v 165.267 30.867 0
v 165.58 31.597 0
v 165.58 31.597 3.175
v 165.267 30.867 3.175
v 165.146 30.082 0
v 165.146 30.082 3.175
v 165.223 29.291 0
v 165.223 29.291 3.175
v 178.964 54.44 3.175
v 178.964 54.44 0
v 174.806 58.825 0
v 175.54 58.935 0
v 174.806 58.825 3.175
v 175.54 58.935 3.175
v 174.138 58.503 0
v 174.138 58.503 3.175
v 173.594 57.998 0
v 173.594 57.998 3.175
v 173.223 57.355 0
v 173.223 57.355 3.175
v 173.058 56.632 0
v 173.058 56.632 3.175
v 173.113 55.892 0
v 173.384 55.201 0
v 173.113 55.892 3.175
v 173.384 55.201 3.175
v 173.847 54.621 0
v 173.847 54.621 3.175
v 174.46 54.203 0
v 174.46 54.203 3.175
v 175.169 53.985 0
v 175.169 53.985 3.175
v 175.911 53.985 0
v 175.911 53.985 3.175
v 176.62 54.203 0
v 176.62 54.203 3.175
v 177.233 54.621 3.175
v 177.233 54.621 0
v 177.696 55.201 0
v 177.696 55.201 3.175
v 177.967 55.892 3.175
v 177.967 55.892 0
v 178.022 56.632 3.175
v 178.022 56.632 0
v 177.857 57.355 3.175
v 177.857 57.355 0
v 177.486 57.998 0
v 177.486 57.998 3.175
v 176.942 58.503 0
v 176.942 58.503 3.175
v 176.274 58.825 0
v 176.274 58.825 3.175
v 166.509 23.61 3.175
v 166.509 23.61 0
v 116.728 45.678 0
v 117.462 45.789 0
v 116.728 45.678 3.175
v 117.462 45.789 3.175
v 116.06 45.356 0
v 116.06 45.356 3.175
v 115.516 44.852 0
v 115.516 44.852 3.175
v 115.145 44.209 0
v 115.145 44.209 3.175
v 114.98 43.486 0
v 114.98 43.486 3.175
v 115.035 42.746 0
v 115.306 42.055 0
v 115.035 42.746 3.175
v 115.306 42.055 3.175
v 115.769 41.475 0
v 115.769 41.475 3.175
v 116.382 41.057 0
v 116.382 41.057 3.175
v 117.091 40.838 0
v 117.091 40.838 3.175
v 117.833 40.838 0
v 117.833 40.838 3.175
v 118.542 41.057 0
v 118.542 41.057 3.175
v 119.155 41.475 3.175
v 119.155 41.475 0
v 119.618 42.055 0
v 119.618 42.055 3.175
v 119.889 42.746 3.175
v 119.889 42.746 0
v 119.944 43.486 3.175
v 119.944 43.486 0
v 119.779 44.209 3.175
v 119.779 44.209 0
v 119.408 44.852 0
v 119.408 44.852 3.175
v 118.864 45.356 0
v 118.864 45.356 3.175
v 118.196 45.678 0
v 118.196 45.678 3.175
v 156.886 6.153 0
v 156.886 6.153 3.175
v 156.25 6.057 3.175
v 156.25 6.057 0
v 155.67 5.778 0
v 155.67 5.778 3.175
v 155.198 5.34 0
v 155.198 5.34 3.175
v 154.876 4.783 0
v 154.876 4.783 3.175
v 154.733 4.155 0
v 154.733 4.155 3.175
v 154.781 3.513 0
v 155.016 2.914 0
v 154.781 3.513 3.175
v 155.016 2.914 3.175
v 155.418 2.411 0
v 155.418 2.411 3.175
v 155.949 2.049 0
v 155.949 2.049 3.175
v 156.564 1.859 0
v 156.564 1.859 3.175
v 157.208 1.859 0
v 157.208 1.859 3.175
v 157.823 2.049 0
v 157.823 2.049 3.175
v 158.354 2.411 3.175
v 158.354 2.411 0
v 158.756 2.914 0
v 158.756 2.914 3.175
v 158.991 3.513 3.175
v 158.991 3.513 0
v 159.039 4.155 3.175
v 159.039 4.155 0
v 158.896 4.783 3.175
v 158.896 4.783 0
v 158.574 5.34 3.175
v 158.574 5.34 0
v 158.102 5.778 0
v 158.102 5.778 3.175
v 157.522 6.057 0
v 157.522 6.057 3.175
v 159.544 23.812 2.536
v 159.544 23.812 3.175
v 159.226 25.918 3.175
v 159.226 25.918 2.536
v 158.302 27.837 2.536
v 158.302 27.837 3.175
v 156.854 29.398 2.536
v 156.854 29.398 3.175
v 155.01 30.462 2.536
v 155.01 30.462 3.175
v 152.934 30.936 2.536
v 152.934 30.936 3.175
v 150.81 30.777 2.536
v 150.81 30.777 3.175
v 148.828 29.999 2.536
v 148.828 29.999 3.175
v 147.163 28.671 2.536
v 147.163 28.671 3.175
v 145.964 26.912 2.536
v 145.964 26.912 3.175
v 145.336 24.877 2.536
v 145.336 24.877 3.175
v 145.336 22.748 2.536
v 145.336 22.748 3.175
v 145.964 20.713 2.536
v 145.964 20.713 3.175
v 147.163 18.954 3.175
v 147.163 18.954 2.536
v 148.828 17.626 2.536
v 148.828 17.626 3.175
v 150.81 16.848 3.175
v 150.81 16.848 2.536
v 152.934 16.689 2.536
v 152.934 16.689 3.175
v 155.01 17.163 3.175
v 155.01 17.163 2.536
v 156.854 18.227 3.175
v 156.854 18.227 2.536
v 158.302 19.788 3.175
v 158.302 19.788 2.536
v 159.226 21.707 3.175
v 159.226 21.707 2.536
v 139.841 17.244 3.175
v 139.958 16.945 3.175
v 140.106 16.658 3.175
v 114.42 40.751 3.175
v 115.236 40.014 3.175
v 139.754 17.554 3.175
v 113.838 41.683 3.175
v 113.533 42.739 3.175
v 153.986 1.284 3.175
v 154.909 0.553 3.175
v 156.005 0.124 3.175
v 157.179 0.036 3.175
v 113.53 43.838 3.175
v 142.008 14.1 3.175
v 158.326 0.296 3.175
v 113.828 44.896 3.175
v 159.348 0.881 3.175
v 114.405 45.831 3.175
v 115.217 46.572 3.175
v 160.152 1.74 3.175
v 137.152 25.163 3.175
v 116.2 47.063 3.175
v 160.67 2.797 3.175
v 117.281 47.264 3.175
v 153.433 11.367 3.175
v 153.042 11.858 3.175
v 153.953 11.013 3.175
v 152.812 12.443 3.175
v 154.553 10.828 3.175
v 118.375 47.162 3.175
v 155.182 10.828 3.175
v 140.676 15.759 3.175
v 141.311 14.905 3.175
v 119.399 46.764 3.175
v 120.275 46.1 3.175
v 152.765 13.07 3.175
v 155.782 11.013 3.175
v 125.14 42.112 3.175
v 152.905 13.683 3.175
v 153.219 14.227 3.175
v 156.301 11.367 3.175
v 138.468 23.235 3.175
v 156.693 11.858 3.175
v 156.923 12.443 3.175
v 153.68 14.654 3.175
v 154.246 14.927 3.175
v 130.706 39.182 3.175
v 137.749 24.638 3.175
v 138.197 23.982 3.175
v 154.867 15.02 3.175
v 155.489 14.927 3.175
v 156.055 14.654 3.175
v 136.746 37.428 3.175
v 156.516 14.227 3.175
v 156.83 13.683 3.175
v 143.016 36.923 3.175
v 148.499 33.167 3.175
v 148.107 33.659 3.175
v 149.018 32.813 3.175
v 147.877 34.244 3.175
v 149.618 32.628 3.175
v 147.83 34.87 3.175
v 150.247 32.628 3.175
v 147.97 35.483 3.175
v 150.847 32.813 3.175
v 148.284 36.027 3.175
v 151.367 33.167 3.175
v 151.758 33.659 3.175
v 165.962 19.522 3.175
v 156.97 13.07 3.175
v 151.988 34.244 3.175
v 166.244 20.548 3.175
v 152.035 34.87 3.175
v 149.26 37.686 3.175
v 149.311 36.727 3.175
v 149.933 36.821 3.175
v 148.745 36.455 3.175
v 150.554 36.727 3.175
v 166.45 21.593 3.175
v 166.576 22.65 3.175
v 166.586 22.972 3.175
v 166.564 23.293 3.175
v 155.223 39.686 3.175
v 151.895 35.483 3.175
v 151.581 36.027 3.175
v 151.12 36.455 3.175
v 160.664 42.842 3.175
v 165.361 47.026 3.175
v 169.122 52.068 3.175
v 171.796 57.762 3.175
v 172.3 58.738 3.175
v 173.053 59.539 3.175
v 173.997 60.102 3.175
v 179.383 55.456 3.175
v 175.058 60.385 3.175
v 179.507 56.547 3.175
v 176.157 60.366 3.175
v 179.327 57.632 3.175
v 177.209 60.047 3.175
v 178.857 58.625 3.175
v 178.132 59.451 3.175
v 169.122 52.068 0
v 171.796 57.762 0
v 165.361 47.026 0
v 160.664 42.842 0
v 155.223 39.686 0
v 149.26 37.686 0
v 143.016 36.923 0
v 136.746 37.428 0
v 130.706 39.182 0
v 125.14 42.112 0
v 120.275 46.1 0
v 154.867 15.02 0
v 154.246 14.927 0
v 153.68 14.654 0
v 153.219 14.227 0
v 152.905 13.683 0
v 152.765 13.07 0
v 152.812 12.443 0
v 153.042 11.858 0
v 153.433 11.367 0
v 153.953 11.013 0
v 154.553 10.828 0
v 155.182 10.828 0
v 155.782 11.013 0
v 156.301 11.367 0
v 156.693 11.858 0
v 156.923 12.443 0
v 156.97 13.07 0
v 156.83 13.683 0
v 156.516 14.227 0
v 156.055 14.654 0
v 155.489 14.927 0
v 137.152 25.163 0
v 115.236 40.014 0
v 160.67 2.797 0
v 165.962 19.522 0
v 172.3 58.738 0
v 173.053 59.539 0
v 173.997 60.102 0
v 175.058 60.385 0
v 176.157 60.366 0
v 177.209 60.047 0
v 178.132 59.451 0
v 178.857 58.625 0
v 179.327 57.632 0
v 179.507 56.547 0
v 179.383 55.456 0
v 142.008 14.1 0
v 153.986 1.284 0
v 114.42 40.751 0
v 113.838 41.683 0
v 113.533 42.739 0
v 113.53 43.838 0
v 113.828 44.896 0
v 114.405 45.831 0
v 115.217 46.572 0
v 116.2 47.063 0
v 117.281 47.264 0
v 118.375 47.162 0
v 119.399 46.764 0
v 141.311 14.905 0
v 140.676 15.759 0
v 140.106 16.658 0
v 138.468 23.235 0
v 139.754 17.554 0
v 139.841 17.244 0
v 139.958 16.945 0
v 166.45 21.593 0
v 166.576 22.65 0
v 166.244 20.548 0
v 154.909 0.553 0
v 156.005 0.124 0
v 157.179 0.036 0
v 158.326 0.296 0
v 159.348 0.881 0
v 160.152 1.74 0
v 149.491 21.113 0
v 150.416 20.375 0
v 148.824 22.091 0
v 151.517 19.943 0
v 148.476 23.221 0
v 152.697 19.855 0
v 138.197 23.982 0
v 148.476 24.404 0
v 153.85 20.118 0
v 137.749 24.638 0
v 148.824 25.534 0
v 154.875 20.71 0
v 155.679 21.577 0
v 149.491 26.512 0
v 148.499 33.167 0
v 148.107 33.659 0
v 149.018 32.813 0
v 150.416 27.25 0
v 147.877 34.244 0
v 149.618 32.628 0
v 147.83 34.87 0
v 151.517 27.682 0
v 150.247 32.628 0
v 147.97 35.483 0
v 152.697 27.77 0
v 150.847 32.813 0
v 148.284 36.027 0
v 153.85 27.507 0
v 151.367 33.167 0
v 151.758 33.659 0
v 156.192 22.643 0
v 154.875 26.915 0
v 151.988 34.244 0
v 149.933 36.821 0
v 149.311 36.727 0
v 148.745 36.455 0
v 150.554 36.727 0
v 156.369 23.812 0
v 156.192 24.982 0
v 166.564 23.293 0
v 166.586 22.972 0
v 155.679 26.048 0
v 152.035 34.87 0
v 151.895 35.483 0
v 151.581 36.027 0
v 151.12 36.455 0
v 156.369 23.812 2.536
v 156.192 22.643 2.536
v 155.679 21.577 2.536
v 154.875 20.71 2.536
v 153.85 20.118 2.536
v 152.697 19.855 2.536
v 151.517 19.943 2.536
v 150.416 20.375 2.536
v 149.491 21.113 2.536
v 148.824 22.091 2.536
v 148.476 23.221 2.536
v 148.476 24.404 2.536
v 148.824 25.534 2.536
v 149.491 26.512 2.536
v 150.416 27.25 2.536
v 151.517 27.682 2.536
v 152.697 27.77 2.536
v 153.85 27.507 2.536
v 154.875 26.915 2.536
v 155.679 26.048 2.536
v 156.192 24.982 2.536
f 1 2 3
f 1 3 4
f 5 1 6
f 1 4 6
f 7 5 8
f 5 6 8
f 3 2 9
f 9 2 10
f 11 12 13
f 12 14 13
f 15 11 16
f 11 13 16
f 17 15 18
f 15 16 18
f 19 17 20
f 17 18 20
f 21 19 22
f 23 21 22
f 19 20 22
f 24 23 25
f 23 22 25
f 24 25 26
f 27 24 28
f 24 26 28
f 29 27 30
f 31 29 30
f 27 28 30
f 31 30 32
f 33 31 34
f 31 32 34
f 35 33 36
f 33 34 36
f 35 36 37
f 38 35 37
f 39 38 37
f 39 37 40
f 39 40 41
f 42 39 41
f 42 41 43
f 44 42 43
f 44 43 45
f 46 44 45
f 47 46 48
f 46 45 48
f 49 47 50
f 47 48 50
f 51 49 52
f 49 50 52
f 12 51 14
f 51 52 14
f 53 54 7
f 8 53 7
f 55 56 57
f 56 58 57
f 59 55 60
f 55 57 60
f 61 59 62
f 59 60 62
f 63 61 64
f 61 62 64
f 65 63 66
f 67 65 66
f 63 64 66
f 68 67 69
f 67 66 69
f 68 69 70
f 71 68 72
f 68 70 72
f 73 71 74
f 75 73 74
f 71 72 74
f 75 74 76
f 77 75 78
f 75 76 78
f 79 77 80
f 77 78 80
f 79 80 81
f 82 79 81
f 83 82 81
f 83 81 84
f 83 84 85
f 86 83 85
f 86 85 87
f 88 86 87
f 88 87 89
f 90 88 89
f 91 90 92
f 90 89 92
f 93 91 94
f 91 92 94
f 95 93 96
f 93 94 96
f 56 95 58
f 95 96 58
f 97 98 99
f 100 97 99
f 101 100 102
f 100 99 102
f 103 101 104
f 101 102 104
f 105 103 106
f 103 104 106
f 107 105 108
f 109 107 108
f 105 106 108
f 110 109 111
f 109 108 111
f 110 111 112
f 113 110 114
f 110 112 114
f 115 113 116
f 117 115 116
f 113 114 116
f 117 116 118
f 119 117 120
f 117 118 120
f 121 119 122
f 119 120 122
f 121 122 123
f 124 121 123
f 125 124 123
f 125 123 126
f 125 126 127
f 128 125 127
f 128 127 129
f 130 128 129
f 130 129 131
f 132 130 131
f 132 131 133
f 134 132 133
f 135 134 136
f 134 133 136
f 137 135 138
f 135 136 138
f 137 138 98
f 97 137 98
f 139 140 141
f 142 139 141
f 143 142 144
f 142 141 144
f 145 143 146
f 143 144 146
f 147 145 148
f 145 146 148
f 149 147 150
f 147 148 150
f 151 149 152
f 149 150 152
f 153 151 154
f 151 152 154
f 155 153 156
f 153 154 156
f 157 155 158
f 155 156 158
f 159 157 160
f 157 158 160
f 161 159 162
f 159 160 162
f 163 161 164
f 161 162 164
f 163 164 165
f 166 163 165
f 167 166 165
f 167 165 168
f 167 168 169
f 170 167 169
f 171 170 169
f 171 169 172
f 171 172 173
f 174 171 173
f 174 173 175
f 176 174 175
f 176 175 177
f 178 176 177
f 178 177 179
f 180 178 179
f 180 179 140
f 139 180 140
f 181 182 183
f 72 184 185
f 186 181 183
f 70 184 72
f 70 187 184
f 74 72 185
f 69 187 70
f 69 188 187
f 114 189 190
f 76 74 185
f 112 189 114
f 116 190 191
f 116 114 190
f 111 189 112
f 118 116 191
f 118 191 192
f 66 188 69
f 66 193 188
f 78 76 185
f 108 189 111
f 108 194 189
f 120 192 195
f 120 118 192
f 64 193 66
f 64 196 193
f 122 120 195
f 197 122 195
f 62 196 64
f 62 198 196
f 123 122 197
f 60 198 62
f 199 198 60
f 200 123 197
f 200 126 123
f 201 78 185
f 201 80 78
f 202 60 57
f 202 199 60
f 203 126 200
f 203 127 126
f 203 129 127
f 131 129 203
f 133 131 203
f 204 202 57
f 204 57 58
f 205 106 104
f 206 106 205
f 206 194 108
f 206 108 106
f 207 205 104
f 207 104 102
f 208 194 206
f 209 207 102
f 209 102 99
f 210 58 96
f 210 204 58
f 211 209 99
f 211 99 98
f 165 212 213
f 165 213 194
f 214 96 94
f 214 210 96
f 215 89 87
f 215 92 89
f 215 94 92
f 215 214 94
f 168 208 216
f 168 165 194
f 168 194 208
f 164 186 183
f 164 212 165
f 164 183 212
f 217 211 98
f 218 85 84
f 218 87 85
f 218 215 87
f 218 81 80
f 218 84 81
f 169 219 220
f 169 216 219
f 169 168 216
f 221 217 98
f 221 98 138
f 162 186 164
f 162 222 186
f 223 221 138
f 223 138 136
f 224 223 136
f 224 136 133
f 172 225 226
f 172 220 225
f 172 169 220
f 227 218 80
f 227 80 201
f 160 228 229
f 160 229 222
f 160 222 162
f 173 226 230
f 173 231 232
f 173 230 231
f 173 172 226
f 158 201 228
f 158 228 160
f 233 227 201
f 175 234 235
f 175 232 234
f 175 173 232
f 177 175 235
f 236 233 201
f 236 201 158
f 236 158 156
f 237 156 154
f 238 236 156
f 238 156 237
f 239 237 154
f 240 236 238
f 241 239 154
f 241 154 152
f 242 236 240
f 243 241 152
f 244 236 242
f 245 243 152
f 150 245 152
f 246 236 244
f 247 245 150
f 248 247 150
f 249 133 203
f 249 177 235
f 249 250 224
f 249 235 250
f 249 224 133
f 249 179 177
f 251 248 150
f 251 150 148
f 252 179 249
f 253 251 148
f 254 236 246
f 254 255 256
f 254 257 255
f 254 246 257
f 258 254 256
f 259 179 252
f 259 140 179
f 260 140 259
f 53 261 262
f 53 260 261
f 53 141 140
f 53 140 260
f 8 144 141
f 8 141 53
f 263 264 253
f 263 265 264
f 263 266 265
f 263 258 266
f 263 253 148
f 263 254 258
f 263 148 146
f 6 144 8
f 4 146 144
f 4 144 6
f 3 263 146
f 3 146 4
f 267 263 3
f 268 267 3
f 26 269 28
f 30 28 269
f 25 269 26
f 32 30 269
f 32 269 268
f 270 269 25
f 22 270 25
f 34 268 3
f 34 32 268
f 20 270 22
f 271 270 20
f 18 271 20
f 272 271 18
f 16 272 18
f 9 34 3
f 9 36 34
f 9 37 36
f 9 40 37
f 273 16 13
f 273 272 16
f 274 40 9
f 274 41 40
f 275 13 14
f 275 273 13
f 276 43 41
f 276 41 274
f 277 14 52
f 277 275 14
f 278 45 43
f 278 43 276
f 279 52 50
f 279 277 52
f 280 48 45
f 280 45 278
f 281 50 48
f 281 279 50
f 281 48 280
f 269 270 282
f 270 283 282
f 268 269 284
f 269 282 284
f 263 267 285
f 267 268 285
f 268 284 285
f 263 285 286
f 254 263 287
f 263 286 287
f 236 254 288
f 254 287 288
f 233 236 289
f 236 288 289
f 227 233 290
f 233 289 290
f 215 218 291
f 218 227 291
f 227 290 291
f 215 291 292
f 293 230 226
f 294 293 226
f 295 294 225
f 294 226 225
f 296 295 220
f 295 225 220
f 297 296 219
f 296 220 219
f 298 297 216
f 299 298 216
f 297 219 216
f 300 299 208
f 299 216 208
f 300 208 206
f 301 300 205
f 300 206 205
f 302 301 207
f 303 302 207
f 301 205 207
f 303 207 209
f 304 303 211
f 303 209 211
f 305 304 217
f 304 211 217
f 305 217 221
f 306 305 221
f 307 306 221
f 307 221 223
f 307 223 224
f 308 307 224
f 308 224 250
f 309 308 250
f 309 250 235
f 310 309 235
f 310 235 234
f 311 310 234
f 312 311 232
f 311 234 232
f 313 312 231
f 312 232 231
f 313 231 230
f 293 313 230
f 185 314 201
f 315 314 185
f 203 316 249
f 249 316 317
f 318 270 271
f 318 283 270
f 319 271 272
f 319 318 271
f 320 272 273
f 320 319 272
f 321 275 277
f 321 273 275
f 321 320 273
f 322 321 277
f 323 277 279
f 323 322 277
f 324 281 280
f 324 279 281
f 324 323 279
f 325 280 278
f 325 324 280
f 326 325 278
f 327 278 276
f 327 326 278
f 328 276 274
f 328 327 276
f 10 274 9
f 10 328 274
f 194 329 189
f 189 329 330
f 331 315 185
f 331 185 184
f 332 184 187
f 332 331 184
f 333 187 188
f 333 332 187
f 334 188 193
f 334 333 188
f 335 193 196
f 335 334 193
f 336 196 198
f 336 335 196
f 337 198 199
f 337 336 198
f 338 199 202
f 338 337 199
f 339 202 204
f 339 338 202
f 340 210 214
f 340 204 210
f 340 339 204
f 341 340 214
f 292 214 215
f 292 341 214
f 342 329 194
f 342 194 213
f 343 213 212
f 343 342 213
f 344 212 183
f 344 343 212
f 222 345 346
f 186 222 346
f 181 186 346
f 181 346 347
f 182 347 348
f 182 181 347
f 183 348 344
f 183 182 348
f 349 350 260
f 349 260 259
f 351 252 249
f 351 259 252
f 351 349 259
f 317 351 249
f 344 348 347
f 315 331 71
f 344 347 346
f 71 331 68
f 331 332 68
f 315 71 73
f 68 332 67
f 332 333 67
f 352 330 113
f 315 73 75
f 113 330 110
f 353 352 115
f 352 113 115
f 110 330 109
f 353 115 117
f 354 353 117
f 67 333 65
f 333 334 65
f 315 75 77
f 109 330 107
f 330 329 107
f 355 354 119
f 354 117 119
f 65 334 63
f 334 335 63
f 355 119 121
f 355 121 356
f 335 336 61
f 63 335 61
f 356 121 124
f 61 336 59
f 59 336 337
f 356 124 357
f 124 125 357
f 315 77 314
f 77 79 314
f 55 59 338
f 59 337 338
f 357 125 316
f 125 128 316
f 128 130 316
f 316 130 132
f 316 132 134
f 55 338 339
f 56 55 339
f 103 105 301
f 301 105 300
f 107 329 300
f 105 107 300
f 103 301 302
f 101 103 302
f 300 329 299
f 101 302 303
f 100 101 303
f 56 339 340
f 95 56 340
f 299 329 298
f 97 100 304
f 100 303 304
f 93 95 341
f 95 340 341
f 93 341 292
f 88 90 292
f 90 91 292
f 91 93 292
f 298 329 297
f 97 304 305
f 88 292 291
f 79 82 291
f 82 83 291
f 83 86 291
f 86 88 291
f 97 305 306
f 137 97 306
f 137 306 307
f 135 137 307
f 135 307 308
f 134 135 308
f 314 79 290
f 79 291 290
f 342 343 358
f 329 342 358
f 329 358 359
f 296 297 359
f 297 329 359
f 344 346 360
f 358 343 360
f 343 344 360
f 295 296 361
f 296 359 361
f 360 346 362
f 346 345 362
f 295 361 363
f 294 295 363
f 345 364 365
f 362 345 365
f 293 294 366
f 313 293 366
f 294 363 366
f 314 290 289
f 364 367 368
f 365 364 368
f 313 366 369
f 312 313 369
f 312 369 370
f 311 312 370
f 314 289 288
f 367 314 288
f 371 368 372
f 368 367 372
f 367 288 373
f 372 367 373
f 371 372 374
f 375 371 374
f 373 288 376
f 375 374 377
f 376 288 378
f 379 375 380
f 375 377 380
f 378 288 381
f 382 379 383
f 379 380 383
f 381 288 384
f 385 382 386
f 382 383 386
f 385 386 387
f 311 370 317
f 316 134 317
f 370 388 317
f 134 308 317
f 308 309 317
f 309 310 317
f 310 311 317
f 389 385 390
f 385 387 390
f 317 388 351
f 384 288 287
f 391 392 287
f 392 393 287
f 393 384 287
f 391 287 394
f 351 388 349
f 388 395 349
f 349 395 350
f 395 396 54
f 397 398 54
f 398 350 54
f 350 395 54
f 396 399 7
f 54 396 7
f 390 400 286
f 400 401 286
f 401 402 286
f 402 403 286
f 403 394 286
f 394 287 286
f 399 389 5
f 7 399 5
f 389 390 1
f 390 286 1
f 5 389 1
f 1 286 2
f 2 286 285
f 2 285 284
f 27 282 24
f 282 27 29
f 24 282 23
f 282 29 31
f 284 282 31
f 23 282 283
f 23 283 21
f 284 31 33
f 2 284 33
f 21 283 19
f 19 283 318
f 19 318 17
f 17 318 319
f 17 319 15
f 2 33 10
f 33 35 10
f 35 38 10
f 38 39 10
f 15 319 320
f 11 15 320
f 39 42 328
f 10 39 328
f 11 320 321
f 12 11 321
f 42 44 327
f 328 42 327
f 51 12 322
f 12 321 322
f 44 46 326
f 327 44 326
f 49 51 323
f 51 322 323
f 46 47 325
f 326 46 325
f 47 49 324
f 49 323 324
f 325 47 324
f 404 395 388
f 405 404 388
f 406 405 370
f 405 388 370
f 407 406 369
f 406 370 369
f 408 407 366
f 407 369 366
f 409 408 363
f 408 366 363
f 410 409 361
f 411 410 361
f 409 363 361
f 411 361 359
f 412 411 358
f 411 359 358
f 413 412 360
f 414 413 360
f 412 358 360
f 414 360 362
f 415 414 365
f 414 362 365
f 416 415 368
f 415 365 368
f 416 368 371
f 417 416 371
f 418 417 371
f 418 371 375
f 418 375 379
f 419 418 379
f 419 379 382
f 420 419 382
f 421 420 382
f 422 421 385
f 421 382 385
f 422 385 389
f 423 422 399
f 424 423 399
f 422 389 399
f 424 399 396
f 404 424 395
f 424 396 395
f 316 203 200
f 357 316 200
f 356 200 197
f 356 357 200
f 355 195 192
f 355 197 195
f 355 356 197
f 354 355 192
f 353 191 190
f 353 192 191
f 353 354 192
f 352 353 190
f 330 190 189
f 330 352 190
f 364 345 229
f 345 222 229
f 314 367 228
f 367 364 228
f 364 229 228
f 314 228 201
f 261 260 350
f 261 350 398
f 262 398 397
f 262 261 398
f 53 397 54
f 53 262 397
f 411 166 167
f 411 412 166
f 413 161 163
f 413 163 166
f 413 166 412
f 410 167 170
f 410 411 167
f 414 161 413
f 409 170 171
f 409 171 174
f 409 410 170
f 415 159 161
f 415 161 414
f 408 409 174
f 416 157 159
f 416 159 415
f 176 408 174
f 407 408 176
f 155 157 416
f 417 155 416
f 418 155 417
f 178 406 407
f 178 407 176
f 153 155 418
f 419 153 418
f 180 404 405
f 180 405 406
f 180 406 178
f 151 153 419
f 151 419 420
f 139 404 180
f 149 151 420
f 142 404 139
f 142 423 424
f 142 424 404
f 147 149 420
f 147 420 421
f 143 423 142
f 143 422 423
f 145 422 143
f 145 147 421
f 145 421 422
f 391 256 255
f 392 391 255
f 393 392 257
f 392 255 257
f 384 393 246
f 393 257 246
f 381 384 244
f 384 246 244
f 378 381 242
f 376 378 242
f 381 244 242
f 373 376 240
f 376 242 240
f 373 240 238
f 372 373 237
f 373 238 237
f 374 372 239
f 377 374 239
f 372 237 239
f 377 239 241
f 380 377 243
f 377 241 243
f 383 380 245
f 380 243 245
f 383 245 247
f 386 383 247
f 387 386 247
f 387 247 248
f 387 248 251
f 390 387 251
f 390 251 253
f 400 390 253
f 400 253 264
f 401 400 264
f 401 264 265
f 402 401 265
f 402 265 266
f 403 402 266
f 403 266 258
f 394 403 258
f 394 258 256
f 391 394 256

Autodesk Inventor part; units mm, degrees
ref_plane "YZ Plane" through (0, 0, 0) normal (1, 0, 0) x (0, 1, 0)
ref_plane "XZ Plane" through (0, 0, 0) normal (0, 1, 0) x (-1, 0, 0)
ref_plane "XY Plane" through (0, 0, 0) normal (0, 0, 1) x (1, 0, 0)
sketch "Main Outline" plane through (0, 0, 0) normal (0, 0, 1) x (1, 0, 0)
  line L0 (0, 0) -> (304.8, 0) construction
  line L1 (304.8, 0) -> (304.8, 50.8) construction
  line L2 (304.8, 50.8) -> (0, 50.8) construction
  line L3 (0, 50.8) -> (0, 0) construction
  line L4 (0, 50.8) -> (0, 53.34) construction
  line L5 (0, 53.34) -> (304.8, 53.34) construction
  line L6 (304.8, 53.34) -> (304.8, 50.8) construction
  circle A0 centre (152.4, 23.8125) radius 17.4625 construction
  line L7 (152.4, 23.8125) -> (152.4, 0) construction
  circle A1 centre (152.4, 23.8125) radius 27.94 construction
  circle A2 centre (152.4, 23.8125) radius 21.59 construction
  line L8 (152.4, 23.8125) -> (144.1569, 60.2292) construction
  circle A3 centre (144.1569, 60.2292) radius 15.24 construction
  circle A4 centre (144.1569, 60.2292) radius 8.89 construction
  circle A5 centre (144.1569, 60.2292) radius 14.2875 construction
  arc A6 (163.8162, 72.0089) -> (128.198, 43.7805) centre (144.1569, 60.2292) ccw construction
  circle A7 centre (98.8106, 85.598) radius 32.258 construction
  circle A8 centre (124.5097, 147.0273) radius 32.258 construction
  circle A9 centre (174.158, 102.6533) radius 32.258 construction
  circle A10 centre (144.1569, 60.2292) radius 11.1125 construction
  circle A11 centre (152.4, 23.8125) radius 49.53 construction
  line L9 (144.1569, 60.2292) -> (124.5097, 147.0273) construction
  line L10 (144.1569, 60.2292) -> (98.8106, 85.598) construction
  line L11 (98.8106, 85.598) -> (174.158, 102.6533) construction
  line L12 (174.158, 102.6533) -> (144.1569, 60.2292) construction
  circle A12 centre (98.8106, 85.598) radius 9.5493 construction
  arc A13 (172.0498, 111.9669) -> (183.1109, 99.3313) centre (174.158, 102.6533) ccw construction
  circle A14 centre (124.5097, 147.0273) radius 9.5493 construction
  line L13 (96.7024, 94.9117) -> (172.0498, 111.9669) construction
  line L14 (183.1109, 99.3313) -> (165.6438, 52.2565) construction
  line L15 (92.161, 78.7444) -> (128.198, 43.7805) construction
  line L16 (172.0498, 111.9669) -> (174.158, 102.6533) construction
  line L17 (174.158, 102.6533) -> (183.1109, 99.3313) construction
  arc A15 (183.1109, 99.3313) -> (172.0498, 111.9669) centre (174.158, 102.6533) ccw construction
  arc A16 (165.6438, 52.2565) -> (163.8162, 72.0089) centre (144.1569, 60.2292) ccw construction
  arc A17 (128.198, 43.7805) -> (165.6438, 52.2565) centre (144.1569, 60.2292) ccw construction
  circle A18 centre (124.4396, 147.337) radius 32.258 construction
  circle A19 centre (124.3695, 147.6466) radius 32.258 construction
  circle A20 centre (124.2994, 147.9563) radius 32.258 construction
  line L18 (124.5097, 147.0273) -> (124.2994, 147.9563) construction
  circle A21 centre (124.5798, 146.7176) radius 32.258 construction
  circle A22 centre (117.4622, 43.2997) radius 9.525 construction
  circle A23 centre (175.54, 56.4459) radius 9.525 construction
  line L19 (152.4, 23.8125) -> (117.4622, 43.2997) construction
  line L20 (152.4, 23.8125) -> (175.54, 56.4459) construction
  line L21 (117.4622, 43.2997) -> (98.8106, 85.598) construction
  line L22 (175.54, 56.4459) -> (174.158, 102.6533) construction
  circle A24 centre (133.7342, 106.2753) radius 7.9375 construction
  line L23 (133.401, 150.5107) -> (165.496, 68.5894) construction
  circle A25 centre (152.4, 23.8125) radius 29.845 construction
  line L24 (114.985, 146.3422) -> (121.2977, 58.5849) construction
  circle A26 centre (99.0876, 85.443) radius 32.258 construction
  circle A27 centre (97.9793, 86.063) radius 32.258 construction
  line L25 (97.9793, 86.063) -> (98.8106, 85.598) construction
  circle A28 centre (98.2564, 85.908) radius 32.258 construction
  circle A29 centre (98.5335, 85.753) radius 32.258 construction
  circle A30 centre (152.4, 23.8125) radius 29.845 construction
  circle A31 centre (122.555, 23.8125) radius 6.35 construction
  circle A32 centre (179.3358, 36.6651) radius 6.35 construction
  line L26 (122.555, 23.8125) -> (152.4, 23.8125) construction
  line L27 (152.4, 23.8125) -> (182.245, 23.8125) construction
  circle A33 centre (182.245, 23.8125) radius 6.35 construction
  circle A34 centre (125.4642, 10.9599) radius 6.35 construction
  circle A35 centre (150.1885, 33.5827) radius 39.8623 construction
  line L28 (72.8944, 65.7819) -> (119.1902, 8.5205) construction
  circle A36 centre (174.708, 103.431) radius 32.258 construction
  line L29 (174.158, 102.6533) -> (174.708, 103.431) construction
  circle A37 centre (174.5246, 103.1717) radius 32.258 construction
  circle A38 centre (174.3413, 102.9125) radius 32.258 construction
  circle A39 centre (173.9747, 102.394) radius 32.258 construction
  line L30 (188.958, 24.3128) -> (206.0816, 95.9295) construction
  circle A40 centre (133.7342, 106.2753) radius 8.1693 construction
  arc A41 (85.4541, 115.7901) -> (94.2274, 135.7949) centre (79.2901, 130.4196) ccw construction
  arc A42 (156.6774, 149.9308) -> (173.2104, 135.6542) centre (172.4734, 151.5121) ccw construction
  line L31 (124.2994, 147.9563) -> (124.8602, 145.479) construction
  line L32 (114.3901, 145.7133) -> (114.9509, 143.236) construction
  line L33 (134.7695, 147.722) -> (134.2088, 150.1993) construction
  arc A43 (134.2088, 150.1993) -> (114.3901, 145.7133) centre (124.2994, 147.9563) ccw construction
  arc A44 (114.9509, 143.236) -> (134.7695, 147.722) centre (124.8602, 145.479) ccw construction
  line L34 (174.708, 103.431) -> (173.2414, 101.3571) construction
  line L35 (166.4126, 109.2972) -> (164.9461, 107.2234) construction
  line L36 (181.5368, 95.4909) -> (183.0033, 97.5647) construction
  arc A45 (183.0033, 97.5647) -> (166.4126, 109.2972) centre (174.708, 103.431) ccw construction
  arc A46 (164.9461, 107.2234) -> (181.5368, 95.4909) centre (173.2414, 101.3571) ccw construction
  line L37 (97.9793, 86.063) -> (100.196, 84.8229) construction
  line L38 (93.0188, 77.1963) -> (95.2355, 75.9562) construction
  line L39 (105.1564, 93.6897) -> (102.9398, 94.9298) construction
  arc A47 (102.9398, 94.9298) -> (93.0188, 77.1963) centre (97.9793, 86.063) ccw construction
  arc A48 (95.2355, 75.9562) -> (105.1564, 93.6897) centre (100.196, 84.8229) ccw construction
  circle A49 centre (117.4622, 43.2997) radius 3.9687 construction
  circle A50 centre (175.54, 56.4459) radius 3.9687 construction
  line L40 (152.4, 23.8125) -> (158.9889, -5.2961) construction
  arc A51 (89.3511, 54.6895) -> (85.9237, 49.6664) centre (88.3927, 51.6626) ccw construction
  arc A52 (201.2624, 75.7739) -> (196.006, 78.8314) centre (198.1744, 76.5122) ccw construction
  circle A53 centre (152.4, 23.8125) radius 14.224 construction
  circle A54 centre (133.7342, 106.2753) radius 3.9687 construction
  circle A55 centre (156.886, 3.9939) radius 6.35 construction
  circle A56 centre (156.886, 3.9939) radius 2.0828 construction
  circle A57 centre (152.4, 23.8125) radius 20.32 construction
  line L41 (132.9935, 29.8368) -> (152.4, 23.8125) construction
  line L42 (152.4, 23.8125) -> (167.3204, 37.6068) construction
  circle A58 centre (167.3204, 37.6068) radius 2.0828 construction
  circle A59 centre (167.3204, 37.6068) radius 3.9687 construction
  circle A60 centre (132.9935, 29.8368) radius 2.0828 construction
  circle A61 centre (132.9935, 29.8368) radius 3.9688 construction
  point P0 (173.9747, 102.394)
  point P1 (99.0876, 85.443)
  dimension "d18" = 99.06
  dimension "d58" = 64.516
  dimension "d86" = 64.516
  dimension "d0" = 304.8
  dimension "d1" = 50.8
  dimension "d2" = 2.54
  dimension "d3" = 34.925
  dimension "d4" = 23.8125
  dimension "d5" = 152.4
  dimension "d6" = 55.88
  dimension "d7" = 43.18
  dimension "d8" = 37.338
  dimension "d10" = 30.48
  dimension "d11" = 17.78
  dimension "d12" = 28.575
  dimension "d13" = 45.8366
  dimension "d14" = 64.516
  dimension "d15" = 64.516
  dimension "d16" = 64.516
  dimension "d17" = 22.225
  dimension "d19" = 51.9602
  dimension "d20" = 88.9939
  dimension "d21" = 19.0986
  dimension "d22" = 19.0986
  dimension "d23" = 19.0986
  dimension "d30" = 123.112
  dimension "d40" = 64.516
  dimension "d41" = 64.516
  dimension "d42" = 64.516
  dimension "d43" = 0.9525
  dimension "d44" = 0.3175
  dimension "d45" = 0.635
  dimension "d46" = 64.516
  dimension "d47" = 0.3175
  dimension "d48" = 19.05
  dimension "d49" = 19.05
  dimension "d50" = 40.005
  dimension "d51" = 40.005
  dimension "d52" = 46.228
  dimension "d54" = 46.228
  dimension "d55" = 15.875
  dimension "d56" = 41.4655
  dimension "d57" = 59.69
  dimension "d59" = 64.516
  dimension "d60" = 64.516
  dimension "d61" = 64.516
  dimension "d62" = 0.3175
  dimension "d63" = 0.3175
  dimension "d64" = 0.635
  dimension "d65" = 0.9525
  dimension "d73" = 12.7
  dimension "d74" = 12.7
  dimension "d76" = 59.69
  dimension "d78" = 12.7
  dimension "d79" = 12.7
  dimension "d80" = 64.516
  dimension "d81" = 0.9525
  dimension "d82" = 64.516
  dimension "d83" = 64.516
  dimension "d84" = 0.3175
  dimension "d85" = 0.635
  dimension "d88" = 0.3175
  dimension "d89" = 31.75
  dimension "d90" = 31.75
  dimension "d94" = 1.5875
  dimension "d95" = 20.32
  dimension "d96" = 1.5875
sketch "Upper CIM C-C Check" plane through (0, 0, 0) normal (0, 0, 1) x (1, 0, 0)
  arc A0 (3.4429, -22.6582) -> (3.4429, 22.6582) centre (0, 0) ccw construction
  arc A1 (90.4285, 9.4409) -> (90.4285, -9.4409) centre (88.9939, 0) ccw construction
  line L0 (88.9939, 0) -> (0, 0) construction
  line L1 (90.4285, 9.4409) -> (3.4429, 22.6582)
  line L2 (3.4429, -22.6582) -> (90.4285, -9.4409)
  arc A2 (90.4285, -9.4409) -> (90.4285, 9.4409) centre (88.9939, 0) ccw
  arc A3 (3.4429, 22.6582) -> (3.4429, -22.6582) centre (0, 0) ccw
  dimension "d24" = 45.8366
  dimension "d25" = 19.0986
  dimension "d26" = 78.9119
  dimension "d27" = 87.984
  dimension "d28" = 27.12
  dimension "d29" = 88.9939
sketch "Sketch3" plane through (0, 0, 0) normal (0, 0, 1) x (1, 0, 0)
  arc A0 (120.2749, 46.0997) -> (115.2358, 40.0143) centre (117.4622, 43.2997) ccw
  arc A1 (178.9642, 54.4395) -> (171.7957, 57.7617) centre (175.54, 56.4459) ccw
  arc A2 (160.6699, 2.7967) -> (153.9865, 1.2839) centre (156.886, 3.9939) ccw construction
  arc A3 (128.198, 43.7805) -> (165.6438, 52.2565) centre (144.1569, 60.2292) ccw construction
  arc A4 (139.8542, 17.11) -> (142.0082, 14.1) centre (152.4, 23.8125) ccw
  line L0 (156.886, 3.9939) -> (144.1569, 60.2292) construction
  circle A5 centre (152.4, 23.8125) radius 11.176 construction
  line L1 (166.6093, 23.1661) -> (164.9458, 30.515)
  line L2 (160.6699, 2.7967) -> (165.9615, 19.5219)
  line L3 (164.9458, 30.515) -> (178.9642, 54.4395)
  line L4 (138.1907, 24.4589) -> (139.8542, 17.11)
  line L5 (142.0082, 14.1) -> (153.9865, 1.2839)
  line L6 (138.1907, 24.4589) -> (115.2358, 40.0143)
  arc A6 (138.1907, 24.4589) -> (139.8542, 17.11) centre (152.4, 23.8125) ccw construction
  arc A7 (164.9458, 30.515) -> (138.1907, 24.4589) centre (152.4, 23.8125) ccw construction
  arc A8 (166.6093, 23.1661) -> (164.9458, 30.515) centre (152.4, 23.8125) ccw construction
  arc A9 (155.5402, 9.9395) -> (165.9615, 19.5219) centre (152.4, 23.8125) ccw construction
  arc A10 (142.0082, 14.1) -> (155.5402, 9.9395) centre (152.4, 23.8125) ccw construction
  arc A11 (165.9615, 19.5219) -> (166.6093, 23.1661) centre (152.4, 23.8125) ccw
  arc A12 (153.9865, 1.2839) -> (160.6699, 2.7967) centre (156.886, 3.9939) ccw
  arc A13 (120.2749, 46.0997) -> (171.7957, 57.7617) centre (142.3753, 68.1002) ccw
  arc A14 (171.7957, 57.7617) -> (120.2749, 46.0997) centre (142.3753, 68.1002) ccw construction
  arc A15 (115.2358, 40.0143) -> (120.2749, 46.0997) centre (117.4622, 43.2997) ccw construction
  arc A16 (171.7957, 57.7617) -> (178.9642, 54.4395) centre (175.54, 56.4459) ccw construction
  circle A17 centre (152.4, 23.8125) radius 3.9688
  point P0 (0, 0)
  point P1 (149.9327, 34.7127)
  point P2 (154.8673, 12.9123)
  dimension "d115" = 7.9375
  dimension "d117" = 22.352
  dimension "d118" = 13.716
  dimension "d119" = 13.716
  dimension "d120" = 14.224
  dimension "d121" = 7.9375
extrude "Extrusion1" add sketch "Sketch3" along normal blind 3.175
hole "Hole1" at (175.54, 56.4459, 0) at (117.4622, 43.2997, 0) direction (0, 0, 1) diameter 4.9784 end through all clearance for "Socket Head Cap Screw" size "#10" standard "Ansi Unified Screw Threads"
hole "Hole2" at (149.9327, 34.7127, 0) at (154.8673, 12.9123, 0) direction (0, 0, 1) diameter 4.2164 end through all
hole "Hole3" at (156.886, 3.9939, 0) direction (0, 0, 1) diameter 4.318 end through all clearance for "Socket Head Cap Screw" size "#8" standard "Ansi Unified Screw Threads"
fillet "Fillet1" radius 3.175 4 edges at (138.1907, 24.4589, 1.5875) (164.9458, 30.515, 1.5875) (166.6093, 23.1661, 1.5875) (139.8542, 17.11, 1.5875)
sketch "Sketch4" plane through (0, 0, 3.175) normal (0, 0, 1) x (1, 0, 0)
  circle A0 centre (152.4, 23.8125) radius 3.9687 projected
  arc A1 (165.9615, 19.5219) -> (166.5764, 22.6501) centre (152.4, 23.8125) ccw projected
  circle A2 centre (152.4, 23.8125) radius 7.1437
  point P0 (0, 0)
  dimension "d146" = 14.2875
extrude "Extrusion2" cut sketch "Sketch4" against normal blind 0.6392
equation "\"d3\" = r10"
equation "\"d6\" = g44"
equation "\"d7\" = g34"
equation "\"d10\" = g24"
equation "\"d11\" = g14"
equation "\"d12\" = r8"
equation "\"d13\" = p48"
equation "\"d14\" = cim"
equation "\"d15\" = cim"
equation "\"d16\" = cim"
equation "\"d17\" = r6"
equation "\"d21\" = p20"
equation "\"d22\" = p20"
equation "\"d23\" = p20"
equation "\"d24\" = p48"
equation "\"d25\" = p20"
equation "\"d29\" = d20"
equation "\"g14\" = 17.78"
equation "\"g24\" = 30.48"
equation "\"g34\" = 43.18"
equation "\"g44\" = 55.88"
equation "\"p20\" = 19.09859"
equation "\"p48\" = 45.83662"
equation "\"r10\" = 34.925"
equation "\"r9\" = 31.75"
equation "\"r8\" = 28.575"
equation "\"r7\" = 25.4"
equation "\"r6\" = 22.225"
equation "\"r5\" = 19.05"
equation "\"r4\" = 15.875"
equation "\"r3\" = 12.7"
equation "\"cim\" = 64.516"
equation "\"act\" = 28.448"
equation "\"actL\" = 23.749"
equation "\"UpperCimCCCheck\" = 2 * d27 + d26 + d28"
equation "\"LowerBeltPathCCCheck\" = 267"
properties material "Aluminum 6061"
